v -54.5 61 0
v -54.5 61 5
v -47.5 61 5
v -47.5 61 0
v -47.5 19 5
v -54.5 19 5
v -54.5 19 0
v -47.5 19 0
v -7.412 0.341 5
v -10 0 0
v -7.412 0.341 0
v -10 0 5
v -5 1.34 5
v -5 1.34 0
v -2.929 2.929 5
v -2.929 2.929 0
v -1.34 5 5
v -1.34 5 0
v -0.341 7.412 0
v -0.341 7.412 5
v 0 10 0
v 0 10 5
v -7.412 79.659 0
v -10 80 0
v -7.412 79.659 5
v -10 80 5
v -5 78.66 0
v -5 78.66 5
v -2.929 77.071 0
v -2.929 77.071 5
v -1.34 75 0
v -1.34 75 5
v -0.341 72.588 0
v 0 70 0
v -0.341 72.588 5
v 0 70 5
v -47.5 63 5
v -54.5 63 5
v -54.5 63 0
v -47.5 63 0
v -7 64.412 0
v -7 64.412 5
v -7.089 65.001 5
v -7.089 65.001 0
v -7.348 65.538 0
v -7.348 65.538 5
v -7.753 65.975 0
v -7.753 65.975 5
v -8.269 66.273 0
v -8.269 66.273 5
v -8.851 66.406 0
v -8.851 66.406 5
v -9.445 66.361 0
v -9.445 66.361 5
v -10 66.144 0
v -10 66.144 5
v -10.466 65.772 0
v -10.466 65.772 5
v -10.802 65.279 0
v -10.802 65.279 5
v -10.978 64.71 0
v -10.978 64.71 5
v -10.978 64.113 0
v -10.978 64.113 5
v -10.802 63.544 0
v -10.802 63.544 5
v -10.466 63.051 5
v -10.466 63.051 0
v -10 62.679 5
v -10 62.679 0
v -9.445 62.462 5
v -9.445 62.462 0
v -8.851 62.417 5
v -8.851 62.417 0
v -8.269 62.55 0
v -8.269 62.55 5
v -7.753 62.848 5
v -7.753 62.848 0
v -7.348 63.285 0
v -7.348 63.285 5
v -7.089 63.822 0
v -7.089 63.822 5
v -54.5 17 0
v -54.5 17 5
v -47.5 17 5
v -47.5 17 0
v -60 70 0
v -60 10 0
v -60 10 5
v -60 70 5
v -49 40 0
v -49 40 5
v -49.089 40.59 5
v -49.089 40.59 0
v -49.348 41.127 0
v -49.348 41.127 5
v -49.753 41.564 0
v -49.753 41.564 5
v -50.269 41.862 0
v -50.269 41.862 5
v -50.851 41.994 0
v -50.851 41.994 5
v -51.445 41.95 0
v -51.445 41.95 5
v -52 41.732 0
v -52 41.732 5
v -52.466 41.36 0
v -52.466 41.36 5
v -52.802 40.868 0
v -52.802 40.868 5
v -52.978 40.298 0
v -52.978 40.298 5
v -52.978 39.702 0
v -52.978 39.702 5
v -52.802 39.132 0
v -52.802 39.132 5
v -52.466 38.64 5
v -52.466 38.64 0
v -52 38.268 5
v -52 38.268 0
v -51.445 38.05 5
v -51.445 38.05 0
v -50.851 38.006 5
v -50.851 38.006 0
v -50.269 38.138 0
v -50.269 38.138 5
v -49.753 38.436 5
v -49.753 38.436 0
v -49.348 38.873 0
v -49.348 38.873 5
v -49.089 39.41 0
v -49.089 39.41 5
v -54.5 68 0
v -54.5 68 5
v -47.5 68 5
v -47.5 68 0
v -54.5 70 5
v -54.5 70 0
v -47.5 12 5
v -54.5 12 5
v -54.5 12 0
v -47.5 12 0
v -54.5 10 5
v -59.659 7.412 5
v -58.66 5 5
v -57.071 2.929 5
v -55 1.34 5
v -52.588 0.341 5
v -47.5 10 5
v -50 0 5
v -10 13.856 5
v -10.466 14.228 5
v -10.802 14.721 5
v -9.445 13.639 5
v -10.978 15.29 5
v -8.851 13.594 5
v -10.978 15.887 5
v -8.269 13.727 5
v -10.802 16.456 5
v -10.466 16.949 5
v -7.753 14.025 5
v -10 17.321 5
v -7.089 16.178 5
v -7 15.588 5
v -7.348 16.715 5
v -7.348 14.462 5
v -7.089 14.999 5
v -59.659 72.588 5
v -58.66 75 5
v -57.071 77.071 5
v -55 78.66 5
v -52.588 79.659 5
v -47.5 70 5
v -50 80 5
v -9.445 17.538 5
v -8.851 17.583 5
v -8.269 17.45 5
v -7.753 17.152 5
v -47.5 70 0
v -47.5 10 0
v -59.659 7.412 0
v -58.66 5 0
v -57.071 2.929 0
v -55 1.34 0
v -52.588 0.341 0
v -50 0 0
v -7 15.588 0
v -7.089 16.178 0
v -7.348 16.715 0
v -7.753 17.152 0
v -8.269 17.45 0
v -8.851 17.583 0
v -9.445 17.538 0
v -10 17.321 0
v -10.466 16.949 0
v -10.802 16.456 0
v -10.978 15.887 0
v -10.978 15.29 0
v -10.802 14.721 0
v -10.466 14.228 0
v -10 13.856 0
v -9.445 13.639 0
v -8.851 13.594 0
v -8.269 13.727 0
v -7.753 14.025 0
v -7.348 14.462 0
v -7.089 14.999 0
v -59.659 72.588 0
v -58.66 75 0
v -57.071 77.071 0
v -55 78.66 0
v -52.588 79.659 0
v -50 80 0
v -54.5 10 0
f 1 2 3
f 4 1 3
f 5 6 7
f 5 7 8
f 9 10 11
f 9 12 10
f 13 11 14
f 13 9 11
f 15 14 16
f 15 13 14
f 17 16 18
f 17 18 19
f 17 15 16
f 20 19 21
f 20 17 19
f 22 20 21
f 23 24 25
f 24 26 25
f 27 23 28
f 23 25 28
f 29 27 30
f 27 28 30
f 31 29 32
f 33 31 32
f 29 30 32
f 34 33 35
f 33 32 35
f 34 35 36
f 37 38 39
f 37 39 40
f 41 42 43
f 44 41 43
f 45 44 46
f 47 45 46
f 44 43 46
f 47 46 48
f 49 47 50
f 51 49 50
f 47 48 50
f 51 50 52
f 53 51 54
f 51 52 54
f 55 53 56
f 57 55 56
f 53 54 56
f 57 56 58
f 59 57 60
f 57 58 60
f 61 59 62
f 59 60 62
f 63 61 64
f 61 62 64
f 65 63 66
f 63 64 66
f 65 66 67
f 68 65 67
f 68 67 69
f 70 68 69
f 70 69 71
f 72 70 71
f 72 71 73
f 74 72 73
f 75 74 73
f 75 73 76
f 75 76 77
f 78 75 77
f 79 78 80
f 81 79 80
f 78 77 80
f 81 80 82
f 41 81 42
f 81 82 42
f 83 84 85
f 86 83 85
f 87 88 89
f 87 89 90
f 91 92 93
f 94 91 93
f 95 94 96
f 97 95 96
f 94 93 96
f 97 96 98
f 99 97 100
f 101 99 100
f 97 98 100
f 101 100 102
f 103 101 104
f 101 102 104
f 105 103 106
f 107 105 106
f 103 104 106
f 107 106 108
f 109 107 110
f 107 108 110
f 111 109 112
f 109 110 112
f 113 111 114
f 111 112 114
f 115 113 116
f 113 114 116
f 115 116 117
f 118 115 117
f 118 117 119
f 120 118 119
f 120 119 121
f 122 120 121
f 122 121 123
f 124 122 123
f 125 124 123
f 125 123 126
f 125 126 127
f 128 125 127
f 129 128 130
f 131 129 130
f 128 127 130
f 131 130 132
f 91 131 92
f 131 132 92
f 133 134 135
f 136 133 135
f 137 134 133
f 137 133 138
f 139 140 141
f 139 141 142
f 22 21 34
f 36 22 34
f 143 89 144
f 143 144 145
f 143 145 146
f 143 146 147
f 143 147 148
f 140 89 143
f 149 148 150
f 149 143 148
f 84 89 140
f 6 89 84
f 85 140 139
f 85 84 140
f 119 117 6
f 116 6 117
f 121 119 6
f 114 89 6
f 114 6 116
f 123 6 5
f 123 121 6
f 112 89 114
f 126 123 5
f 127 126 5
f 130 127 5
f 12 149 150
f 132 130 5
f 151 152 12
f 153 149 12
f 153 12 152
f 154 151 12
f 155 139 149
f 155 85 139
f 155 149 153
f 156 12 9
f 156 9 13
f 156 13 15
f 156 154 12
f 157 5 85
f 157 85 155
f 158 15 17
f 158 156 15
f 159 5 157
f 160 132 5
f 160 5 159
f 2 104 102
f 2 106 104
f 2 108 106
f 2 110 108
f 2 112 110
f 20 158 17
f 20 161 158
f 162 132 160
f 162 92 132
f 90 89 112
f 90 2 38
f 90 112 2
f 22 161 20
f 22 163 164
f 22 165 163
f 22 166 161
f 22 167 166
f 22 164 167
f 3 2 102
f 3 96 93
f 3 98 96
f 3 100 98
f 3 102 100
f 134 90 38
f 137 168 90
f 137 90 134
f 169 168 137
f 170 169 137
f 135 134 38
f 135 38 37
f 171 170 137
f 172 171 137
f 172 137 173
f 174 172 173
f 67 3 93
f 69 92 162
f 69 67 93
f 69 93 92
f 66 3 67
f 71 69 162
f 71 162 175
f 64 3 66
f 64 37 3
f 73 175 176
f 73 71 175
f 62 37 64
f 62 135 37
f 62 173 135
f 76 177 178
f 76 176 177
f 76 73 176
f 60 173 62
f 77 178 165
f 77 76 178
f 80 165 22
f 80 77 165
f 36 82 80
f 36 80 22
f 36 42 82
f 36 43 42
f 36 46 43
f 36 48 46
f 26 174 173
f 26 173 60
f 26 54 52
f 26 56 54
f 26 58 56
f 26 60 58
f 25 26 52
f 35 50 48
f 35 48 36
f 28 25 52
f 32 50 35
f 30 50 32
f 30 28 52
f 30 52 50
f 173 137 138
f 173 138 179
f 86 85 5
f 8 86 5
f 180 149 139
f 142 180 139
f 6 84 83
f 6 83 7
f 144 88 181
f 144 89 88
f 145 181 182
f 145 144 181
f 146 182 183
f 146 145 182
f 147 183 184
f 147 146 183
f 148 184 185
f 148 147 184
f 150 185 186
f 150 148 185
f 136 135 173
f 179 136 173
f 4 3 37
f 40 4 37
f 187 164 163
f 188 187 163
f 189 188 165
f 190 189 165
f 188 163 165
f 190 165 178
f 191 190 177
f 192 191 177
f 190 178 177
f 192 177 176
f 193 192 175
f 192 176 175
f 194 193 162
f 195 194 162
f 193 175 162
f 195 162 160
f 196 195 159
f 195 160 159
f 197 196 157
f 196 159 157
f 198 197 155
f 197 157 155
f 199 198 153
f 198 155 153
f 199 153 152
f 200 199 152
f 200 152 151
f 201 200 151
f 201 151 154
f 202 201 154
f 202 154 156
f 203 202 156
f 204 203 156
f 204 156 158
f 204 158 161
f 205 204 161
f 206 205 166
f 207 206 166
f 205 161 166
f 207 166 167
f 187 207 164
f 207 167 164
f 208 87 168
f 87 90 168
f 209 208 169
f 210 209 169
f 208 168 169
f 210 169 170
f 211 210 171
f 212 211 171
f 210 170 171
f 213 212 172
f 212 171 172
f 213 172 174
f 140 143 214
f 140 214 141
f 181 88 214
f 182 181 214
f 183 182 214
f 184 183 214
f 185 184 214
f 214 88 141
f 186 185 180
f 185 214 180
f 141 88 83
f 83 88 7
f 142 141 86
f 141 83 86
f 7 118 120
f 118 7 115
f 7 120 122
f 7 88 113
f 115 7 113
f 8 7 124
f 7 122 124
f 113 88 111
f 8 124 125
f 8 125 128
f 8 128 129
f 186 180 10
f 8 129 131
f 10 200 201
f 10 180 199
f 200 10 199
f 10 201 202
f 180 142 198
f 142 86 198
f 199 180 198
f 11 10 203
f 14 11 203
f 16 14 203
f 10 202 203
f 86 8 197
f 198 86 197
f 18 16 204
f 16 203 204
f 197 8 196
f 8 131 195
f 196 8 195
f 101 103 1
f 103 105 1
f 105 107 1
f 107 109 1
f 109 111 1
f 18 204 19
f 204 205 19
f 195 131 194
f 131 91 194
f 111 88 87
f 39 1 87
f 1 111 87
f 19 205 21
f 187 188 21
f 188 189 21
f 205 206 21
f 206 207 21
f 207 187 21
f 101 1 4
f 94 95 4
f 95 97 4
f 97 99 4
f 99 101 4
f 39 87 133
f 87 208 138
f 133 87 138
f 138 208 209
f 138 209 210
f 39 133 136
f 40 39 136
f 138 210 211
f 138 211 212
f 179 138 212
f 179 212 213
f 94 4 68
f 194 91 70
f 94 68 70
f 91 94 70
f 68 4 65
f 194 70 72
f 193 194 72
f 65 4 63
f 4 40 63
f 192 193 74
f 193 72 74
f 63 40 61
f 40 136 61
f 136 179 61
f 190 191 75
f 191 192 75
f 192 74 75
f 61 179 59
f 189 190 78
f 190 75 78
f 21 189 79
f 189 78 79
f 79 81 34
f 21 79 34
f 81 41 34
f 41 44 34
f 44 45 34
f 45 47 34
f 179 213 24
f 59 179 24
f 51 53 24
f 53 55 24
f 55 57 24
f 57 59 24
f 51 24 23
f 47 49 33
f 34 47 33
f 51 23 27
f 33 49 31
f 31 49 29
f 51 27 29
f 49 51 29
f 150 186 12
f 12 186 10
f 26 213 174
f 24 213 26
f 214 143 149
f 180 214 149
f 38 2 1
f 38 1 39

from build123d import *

# Parameters (mm, degrees)
SKETCH1_W           = 60
SKETCH1_H           = 80
BOSS_EXTRUDE1_DEPTH = 5
SKETCH2_R           = 2
CUT_EXTRUDE1_DEPTH  = 5
SKETCH3_W           = 7
SKETCH3_H           = 2
CUT_EXTRUDE2_DEPTH  = 5
FILLET2_R           = 10


with BuildPart() as part:
    # Sketch1 → Boss-Extrude1 (new body)
    with BuildSketch(Plane.XY):
        with Locations((-30, 40)):
            Rectangle(SKETCH1_W, SKETCH1_H)
    extrude(amount=BOSS_EXTRUDE1_DEPTH)

    # Sketch2 → Cut-Extrude1 (cut)
    with BuildSketch(Plane.XY.offset(5)):
        with Locations((-51, 40)):
            Circle(SKETCH2_R)
        with Locations((-9, 64.411542732)):
            Circle(SKETCH2_R)
        with Locations((-9, 15.588457268)):
            Circle(SKETCH2_R)
    extrude(amount=-CUT_EXTRUDE1_DEPTH, mode=Mode.SUBTRACT)

    # Sketch3 → Cut-Extrude2 (cut)
    with BuildSketch(Plane.XY.offset(5)):
        with Locations((-51, 69)):
            Rectangle(SKETCH3_W, SKETCH3_H)
        with Locations((-51, 62)):
            Rectangle(SKETCH3_W, SKETCH3_H)
        with Locations((-51, 18)):
            Rectangle(SKETCH3_W, SKETCH3_H)
        with Locations((-51, 11)):
            Rectangle(SKETCH3_W, SKETCH3_H)
    extrude(amount=-CUT_EXTRUDE2_DEPTH, mode=Mode.SUBTRACT)

    # Fillet2
    fillet2_edges = [part.edges().sort_by_distance(p)[0] for p in [
        (-60, 0, 2.5),
        (-60, 80, 2.5),
        (0, 80, 2.5),
        (0, 0, 2.5),
    ]]
    fillet(fillet2_edges, radius=FILLET2_R)


solid = part.part
